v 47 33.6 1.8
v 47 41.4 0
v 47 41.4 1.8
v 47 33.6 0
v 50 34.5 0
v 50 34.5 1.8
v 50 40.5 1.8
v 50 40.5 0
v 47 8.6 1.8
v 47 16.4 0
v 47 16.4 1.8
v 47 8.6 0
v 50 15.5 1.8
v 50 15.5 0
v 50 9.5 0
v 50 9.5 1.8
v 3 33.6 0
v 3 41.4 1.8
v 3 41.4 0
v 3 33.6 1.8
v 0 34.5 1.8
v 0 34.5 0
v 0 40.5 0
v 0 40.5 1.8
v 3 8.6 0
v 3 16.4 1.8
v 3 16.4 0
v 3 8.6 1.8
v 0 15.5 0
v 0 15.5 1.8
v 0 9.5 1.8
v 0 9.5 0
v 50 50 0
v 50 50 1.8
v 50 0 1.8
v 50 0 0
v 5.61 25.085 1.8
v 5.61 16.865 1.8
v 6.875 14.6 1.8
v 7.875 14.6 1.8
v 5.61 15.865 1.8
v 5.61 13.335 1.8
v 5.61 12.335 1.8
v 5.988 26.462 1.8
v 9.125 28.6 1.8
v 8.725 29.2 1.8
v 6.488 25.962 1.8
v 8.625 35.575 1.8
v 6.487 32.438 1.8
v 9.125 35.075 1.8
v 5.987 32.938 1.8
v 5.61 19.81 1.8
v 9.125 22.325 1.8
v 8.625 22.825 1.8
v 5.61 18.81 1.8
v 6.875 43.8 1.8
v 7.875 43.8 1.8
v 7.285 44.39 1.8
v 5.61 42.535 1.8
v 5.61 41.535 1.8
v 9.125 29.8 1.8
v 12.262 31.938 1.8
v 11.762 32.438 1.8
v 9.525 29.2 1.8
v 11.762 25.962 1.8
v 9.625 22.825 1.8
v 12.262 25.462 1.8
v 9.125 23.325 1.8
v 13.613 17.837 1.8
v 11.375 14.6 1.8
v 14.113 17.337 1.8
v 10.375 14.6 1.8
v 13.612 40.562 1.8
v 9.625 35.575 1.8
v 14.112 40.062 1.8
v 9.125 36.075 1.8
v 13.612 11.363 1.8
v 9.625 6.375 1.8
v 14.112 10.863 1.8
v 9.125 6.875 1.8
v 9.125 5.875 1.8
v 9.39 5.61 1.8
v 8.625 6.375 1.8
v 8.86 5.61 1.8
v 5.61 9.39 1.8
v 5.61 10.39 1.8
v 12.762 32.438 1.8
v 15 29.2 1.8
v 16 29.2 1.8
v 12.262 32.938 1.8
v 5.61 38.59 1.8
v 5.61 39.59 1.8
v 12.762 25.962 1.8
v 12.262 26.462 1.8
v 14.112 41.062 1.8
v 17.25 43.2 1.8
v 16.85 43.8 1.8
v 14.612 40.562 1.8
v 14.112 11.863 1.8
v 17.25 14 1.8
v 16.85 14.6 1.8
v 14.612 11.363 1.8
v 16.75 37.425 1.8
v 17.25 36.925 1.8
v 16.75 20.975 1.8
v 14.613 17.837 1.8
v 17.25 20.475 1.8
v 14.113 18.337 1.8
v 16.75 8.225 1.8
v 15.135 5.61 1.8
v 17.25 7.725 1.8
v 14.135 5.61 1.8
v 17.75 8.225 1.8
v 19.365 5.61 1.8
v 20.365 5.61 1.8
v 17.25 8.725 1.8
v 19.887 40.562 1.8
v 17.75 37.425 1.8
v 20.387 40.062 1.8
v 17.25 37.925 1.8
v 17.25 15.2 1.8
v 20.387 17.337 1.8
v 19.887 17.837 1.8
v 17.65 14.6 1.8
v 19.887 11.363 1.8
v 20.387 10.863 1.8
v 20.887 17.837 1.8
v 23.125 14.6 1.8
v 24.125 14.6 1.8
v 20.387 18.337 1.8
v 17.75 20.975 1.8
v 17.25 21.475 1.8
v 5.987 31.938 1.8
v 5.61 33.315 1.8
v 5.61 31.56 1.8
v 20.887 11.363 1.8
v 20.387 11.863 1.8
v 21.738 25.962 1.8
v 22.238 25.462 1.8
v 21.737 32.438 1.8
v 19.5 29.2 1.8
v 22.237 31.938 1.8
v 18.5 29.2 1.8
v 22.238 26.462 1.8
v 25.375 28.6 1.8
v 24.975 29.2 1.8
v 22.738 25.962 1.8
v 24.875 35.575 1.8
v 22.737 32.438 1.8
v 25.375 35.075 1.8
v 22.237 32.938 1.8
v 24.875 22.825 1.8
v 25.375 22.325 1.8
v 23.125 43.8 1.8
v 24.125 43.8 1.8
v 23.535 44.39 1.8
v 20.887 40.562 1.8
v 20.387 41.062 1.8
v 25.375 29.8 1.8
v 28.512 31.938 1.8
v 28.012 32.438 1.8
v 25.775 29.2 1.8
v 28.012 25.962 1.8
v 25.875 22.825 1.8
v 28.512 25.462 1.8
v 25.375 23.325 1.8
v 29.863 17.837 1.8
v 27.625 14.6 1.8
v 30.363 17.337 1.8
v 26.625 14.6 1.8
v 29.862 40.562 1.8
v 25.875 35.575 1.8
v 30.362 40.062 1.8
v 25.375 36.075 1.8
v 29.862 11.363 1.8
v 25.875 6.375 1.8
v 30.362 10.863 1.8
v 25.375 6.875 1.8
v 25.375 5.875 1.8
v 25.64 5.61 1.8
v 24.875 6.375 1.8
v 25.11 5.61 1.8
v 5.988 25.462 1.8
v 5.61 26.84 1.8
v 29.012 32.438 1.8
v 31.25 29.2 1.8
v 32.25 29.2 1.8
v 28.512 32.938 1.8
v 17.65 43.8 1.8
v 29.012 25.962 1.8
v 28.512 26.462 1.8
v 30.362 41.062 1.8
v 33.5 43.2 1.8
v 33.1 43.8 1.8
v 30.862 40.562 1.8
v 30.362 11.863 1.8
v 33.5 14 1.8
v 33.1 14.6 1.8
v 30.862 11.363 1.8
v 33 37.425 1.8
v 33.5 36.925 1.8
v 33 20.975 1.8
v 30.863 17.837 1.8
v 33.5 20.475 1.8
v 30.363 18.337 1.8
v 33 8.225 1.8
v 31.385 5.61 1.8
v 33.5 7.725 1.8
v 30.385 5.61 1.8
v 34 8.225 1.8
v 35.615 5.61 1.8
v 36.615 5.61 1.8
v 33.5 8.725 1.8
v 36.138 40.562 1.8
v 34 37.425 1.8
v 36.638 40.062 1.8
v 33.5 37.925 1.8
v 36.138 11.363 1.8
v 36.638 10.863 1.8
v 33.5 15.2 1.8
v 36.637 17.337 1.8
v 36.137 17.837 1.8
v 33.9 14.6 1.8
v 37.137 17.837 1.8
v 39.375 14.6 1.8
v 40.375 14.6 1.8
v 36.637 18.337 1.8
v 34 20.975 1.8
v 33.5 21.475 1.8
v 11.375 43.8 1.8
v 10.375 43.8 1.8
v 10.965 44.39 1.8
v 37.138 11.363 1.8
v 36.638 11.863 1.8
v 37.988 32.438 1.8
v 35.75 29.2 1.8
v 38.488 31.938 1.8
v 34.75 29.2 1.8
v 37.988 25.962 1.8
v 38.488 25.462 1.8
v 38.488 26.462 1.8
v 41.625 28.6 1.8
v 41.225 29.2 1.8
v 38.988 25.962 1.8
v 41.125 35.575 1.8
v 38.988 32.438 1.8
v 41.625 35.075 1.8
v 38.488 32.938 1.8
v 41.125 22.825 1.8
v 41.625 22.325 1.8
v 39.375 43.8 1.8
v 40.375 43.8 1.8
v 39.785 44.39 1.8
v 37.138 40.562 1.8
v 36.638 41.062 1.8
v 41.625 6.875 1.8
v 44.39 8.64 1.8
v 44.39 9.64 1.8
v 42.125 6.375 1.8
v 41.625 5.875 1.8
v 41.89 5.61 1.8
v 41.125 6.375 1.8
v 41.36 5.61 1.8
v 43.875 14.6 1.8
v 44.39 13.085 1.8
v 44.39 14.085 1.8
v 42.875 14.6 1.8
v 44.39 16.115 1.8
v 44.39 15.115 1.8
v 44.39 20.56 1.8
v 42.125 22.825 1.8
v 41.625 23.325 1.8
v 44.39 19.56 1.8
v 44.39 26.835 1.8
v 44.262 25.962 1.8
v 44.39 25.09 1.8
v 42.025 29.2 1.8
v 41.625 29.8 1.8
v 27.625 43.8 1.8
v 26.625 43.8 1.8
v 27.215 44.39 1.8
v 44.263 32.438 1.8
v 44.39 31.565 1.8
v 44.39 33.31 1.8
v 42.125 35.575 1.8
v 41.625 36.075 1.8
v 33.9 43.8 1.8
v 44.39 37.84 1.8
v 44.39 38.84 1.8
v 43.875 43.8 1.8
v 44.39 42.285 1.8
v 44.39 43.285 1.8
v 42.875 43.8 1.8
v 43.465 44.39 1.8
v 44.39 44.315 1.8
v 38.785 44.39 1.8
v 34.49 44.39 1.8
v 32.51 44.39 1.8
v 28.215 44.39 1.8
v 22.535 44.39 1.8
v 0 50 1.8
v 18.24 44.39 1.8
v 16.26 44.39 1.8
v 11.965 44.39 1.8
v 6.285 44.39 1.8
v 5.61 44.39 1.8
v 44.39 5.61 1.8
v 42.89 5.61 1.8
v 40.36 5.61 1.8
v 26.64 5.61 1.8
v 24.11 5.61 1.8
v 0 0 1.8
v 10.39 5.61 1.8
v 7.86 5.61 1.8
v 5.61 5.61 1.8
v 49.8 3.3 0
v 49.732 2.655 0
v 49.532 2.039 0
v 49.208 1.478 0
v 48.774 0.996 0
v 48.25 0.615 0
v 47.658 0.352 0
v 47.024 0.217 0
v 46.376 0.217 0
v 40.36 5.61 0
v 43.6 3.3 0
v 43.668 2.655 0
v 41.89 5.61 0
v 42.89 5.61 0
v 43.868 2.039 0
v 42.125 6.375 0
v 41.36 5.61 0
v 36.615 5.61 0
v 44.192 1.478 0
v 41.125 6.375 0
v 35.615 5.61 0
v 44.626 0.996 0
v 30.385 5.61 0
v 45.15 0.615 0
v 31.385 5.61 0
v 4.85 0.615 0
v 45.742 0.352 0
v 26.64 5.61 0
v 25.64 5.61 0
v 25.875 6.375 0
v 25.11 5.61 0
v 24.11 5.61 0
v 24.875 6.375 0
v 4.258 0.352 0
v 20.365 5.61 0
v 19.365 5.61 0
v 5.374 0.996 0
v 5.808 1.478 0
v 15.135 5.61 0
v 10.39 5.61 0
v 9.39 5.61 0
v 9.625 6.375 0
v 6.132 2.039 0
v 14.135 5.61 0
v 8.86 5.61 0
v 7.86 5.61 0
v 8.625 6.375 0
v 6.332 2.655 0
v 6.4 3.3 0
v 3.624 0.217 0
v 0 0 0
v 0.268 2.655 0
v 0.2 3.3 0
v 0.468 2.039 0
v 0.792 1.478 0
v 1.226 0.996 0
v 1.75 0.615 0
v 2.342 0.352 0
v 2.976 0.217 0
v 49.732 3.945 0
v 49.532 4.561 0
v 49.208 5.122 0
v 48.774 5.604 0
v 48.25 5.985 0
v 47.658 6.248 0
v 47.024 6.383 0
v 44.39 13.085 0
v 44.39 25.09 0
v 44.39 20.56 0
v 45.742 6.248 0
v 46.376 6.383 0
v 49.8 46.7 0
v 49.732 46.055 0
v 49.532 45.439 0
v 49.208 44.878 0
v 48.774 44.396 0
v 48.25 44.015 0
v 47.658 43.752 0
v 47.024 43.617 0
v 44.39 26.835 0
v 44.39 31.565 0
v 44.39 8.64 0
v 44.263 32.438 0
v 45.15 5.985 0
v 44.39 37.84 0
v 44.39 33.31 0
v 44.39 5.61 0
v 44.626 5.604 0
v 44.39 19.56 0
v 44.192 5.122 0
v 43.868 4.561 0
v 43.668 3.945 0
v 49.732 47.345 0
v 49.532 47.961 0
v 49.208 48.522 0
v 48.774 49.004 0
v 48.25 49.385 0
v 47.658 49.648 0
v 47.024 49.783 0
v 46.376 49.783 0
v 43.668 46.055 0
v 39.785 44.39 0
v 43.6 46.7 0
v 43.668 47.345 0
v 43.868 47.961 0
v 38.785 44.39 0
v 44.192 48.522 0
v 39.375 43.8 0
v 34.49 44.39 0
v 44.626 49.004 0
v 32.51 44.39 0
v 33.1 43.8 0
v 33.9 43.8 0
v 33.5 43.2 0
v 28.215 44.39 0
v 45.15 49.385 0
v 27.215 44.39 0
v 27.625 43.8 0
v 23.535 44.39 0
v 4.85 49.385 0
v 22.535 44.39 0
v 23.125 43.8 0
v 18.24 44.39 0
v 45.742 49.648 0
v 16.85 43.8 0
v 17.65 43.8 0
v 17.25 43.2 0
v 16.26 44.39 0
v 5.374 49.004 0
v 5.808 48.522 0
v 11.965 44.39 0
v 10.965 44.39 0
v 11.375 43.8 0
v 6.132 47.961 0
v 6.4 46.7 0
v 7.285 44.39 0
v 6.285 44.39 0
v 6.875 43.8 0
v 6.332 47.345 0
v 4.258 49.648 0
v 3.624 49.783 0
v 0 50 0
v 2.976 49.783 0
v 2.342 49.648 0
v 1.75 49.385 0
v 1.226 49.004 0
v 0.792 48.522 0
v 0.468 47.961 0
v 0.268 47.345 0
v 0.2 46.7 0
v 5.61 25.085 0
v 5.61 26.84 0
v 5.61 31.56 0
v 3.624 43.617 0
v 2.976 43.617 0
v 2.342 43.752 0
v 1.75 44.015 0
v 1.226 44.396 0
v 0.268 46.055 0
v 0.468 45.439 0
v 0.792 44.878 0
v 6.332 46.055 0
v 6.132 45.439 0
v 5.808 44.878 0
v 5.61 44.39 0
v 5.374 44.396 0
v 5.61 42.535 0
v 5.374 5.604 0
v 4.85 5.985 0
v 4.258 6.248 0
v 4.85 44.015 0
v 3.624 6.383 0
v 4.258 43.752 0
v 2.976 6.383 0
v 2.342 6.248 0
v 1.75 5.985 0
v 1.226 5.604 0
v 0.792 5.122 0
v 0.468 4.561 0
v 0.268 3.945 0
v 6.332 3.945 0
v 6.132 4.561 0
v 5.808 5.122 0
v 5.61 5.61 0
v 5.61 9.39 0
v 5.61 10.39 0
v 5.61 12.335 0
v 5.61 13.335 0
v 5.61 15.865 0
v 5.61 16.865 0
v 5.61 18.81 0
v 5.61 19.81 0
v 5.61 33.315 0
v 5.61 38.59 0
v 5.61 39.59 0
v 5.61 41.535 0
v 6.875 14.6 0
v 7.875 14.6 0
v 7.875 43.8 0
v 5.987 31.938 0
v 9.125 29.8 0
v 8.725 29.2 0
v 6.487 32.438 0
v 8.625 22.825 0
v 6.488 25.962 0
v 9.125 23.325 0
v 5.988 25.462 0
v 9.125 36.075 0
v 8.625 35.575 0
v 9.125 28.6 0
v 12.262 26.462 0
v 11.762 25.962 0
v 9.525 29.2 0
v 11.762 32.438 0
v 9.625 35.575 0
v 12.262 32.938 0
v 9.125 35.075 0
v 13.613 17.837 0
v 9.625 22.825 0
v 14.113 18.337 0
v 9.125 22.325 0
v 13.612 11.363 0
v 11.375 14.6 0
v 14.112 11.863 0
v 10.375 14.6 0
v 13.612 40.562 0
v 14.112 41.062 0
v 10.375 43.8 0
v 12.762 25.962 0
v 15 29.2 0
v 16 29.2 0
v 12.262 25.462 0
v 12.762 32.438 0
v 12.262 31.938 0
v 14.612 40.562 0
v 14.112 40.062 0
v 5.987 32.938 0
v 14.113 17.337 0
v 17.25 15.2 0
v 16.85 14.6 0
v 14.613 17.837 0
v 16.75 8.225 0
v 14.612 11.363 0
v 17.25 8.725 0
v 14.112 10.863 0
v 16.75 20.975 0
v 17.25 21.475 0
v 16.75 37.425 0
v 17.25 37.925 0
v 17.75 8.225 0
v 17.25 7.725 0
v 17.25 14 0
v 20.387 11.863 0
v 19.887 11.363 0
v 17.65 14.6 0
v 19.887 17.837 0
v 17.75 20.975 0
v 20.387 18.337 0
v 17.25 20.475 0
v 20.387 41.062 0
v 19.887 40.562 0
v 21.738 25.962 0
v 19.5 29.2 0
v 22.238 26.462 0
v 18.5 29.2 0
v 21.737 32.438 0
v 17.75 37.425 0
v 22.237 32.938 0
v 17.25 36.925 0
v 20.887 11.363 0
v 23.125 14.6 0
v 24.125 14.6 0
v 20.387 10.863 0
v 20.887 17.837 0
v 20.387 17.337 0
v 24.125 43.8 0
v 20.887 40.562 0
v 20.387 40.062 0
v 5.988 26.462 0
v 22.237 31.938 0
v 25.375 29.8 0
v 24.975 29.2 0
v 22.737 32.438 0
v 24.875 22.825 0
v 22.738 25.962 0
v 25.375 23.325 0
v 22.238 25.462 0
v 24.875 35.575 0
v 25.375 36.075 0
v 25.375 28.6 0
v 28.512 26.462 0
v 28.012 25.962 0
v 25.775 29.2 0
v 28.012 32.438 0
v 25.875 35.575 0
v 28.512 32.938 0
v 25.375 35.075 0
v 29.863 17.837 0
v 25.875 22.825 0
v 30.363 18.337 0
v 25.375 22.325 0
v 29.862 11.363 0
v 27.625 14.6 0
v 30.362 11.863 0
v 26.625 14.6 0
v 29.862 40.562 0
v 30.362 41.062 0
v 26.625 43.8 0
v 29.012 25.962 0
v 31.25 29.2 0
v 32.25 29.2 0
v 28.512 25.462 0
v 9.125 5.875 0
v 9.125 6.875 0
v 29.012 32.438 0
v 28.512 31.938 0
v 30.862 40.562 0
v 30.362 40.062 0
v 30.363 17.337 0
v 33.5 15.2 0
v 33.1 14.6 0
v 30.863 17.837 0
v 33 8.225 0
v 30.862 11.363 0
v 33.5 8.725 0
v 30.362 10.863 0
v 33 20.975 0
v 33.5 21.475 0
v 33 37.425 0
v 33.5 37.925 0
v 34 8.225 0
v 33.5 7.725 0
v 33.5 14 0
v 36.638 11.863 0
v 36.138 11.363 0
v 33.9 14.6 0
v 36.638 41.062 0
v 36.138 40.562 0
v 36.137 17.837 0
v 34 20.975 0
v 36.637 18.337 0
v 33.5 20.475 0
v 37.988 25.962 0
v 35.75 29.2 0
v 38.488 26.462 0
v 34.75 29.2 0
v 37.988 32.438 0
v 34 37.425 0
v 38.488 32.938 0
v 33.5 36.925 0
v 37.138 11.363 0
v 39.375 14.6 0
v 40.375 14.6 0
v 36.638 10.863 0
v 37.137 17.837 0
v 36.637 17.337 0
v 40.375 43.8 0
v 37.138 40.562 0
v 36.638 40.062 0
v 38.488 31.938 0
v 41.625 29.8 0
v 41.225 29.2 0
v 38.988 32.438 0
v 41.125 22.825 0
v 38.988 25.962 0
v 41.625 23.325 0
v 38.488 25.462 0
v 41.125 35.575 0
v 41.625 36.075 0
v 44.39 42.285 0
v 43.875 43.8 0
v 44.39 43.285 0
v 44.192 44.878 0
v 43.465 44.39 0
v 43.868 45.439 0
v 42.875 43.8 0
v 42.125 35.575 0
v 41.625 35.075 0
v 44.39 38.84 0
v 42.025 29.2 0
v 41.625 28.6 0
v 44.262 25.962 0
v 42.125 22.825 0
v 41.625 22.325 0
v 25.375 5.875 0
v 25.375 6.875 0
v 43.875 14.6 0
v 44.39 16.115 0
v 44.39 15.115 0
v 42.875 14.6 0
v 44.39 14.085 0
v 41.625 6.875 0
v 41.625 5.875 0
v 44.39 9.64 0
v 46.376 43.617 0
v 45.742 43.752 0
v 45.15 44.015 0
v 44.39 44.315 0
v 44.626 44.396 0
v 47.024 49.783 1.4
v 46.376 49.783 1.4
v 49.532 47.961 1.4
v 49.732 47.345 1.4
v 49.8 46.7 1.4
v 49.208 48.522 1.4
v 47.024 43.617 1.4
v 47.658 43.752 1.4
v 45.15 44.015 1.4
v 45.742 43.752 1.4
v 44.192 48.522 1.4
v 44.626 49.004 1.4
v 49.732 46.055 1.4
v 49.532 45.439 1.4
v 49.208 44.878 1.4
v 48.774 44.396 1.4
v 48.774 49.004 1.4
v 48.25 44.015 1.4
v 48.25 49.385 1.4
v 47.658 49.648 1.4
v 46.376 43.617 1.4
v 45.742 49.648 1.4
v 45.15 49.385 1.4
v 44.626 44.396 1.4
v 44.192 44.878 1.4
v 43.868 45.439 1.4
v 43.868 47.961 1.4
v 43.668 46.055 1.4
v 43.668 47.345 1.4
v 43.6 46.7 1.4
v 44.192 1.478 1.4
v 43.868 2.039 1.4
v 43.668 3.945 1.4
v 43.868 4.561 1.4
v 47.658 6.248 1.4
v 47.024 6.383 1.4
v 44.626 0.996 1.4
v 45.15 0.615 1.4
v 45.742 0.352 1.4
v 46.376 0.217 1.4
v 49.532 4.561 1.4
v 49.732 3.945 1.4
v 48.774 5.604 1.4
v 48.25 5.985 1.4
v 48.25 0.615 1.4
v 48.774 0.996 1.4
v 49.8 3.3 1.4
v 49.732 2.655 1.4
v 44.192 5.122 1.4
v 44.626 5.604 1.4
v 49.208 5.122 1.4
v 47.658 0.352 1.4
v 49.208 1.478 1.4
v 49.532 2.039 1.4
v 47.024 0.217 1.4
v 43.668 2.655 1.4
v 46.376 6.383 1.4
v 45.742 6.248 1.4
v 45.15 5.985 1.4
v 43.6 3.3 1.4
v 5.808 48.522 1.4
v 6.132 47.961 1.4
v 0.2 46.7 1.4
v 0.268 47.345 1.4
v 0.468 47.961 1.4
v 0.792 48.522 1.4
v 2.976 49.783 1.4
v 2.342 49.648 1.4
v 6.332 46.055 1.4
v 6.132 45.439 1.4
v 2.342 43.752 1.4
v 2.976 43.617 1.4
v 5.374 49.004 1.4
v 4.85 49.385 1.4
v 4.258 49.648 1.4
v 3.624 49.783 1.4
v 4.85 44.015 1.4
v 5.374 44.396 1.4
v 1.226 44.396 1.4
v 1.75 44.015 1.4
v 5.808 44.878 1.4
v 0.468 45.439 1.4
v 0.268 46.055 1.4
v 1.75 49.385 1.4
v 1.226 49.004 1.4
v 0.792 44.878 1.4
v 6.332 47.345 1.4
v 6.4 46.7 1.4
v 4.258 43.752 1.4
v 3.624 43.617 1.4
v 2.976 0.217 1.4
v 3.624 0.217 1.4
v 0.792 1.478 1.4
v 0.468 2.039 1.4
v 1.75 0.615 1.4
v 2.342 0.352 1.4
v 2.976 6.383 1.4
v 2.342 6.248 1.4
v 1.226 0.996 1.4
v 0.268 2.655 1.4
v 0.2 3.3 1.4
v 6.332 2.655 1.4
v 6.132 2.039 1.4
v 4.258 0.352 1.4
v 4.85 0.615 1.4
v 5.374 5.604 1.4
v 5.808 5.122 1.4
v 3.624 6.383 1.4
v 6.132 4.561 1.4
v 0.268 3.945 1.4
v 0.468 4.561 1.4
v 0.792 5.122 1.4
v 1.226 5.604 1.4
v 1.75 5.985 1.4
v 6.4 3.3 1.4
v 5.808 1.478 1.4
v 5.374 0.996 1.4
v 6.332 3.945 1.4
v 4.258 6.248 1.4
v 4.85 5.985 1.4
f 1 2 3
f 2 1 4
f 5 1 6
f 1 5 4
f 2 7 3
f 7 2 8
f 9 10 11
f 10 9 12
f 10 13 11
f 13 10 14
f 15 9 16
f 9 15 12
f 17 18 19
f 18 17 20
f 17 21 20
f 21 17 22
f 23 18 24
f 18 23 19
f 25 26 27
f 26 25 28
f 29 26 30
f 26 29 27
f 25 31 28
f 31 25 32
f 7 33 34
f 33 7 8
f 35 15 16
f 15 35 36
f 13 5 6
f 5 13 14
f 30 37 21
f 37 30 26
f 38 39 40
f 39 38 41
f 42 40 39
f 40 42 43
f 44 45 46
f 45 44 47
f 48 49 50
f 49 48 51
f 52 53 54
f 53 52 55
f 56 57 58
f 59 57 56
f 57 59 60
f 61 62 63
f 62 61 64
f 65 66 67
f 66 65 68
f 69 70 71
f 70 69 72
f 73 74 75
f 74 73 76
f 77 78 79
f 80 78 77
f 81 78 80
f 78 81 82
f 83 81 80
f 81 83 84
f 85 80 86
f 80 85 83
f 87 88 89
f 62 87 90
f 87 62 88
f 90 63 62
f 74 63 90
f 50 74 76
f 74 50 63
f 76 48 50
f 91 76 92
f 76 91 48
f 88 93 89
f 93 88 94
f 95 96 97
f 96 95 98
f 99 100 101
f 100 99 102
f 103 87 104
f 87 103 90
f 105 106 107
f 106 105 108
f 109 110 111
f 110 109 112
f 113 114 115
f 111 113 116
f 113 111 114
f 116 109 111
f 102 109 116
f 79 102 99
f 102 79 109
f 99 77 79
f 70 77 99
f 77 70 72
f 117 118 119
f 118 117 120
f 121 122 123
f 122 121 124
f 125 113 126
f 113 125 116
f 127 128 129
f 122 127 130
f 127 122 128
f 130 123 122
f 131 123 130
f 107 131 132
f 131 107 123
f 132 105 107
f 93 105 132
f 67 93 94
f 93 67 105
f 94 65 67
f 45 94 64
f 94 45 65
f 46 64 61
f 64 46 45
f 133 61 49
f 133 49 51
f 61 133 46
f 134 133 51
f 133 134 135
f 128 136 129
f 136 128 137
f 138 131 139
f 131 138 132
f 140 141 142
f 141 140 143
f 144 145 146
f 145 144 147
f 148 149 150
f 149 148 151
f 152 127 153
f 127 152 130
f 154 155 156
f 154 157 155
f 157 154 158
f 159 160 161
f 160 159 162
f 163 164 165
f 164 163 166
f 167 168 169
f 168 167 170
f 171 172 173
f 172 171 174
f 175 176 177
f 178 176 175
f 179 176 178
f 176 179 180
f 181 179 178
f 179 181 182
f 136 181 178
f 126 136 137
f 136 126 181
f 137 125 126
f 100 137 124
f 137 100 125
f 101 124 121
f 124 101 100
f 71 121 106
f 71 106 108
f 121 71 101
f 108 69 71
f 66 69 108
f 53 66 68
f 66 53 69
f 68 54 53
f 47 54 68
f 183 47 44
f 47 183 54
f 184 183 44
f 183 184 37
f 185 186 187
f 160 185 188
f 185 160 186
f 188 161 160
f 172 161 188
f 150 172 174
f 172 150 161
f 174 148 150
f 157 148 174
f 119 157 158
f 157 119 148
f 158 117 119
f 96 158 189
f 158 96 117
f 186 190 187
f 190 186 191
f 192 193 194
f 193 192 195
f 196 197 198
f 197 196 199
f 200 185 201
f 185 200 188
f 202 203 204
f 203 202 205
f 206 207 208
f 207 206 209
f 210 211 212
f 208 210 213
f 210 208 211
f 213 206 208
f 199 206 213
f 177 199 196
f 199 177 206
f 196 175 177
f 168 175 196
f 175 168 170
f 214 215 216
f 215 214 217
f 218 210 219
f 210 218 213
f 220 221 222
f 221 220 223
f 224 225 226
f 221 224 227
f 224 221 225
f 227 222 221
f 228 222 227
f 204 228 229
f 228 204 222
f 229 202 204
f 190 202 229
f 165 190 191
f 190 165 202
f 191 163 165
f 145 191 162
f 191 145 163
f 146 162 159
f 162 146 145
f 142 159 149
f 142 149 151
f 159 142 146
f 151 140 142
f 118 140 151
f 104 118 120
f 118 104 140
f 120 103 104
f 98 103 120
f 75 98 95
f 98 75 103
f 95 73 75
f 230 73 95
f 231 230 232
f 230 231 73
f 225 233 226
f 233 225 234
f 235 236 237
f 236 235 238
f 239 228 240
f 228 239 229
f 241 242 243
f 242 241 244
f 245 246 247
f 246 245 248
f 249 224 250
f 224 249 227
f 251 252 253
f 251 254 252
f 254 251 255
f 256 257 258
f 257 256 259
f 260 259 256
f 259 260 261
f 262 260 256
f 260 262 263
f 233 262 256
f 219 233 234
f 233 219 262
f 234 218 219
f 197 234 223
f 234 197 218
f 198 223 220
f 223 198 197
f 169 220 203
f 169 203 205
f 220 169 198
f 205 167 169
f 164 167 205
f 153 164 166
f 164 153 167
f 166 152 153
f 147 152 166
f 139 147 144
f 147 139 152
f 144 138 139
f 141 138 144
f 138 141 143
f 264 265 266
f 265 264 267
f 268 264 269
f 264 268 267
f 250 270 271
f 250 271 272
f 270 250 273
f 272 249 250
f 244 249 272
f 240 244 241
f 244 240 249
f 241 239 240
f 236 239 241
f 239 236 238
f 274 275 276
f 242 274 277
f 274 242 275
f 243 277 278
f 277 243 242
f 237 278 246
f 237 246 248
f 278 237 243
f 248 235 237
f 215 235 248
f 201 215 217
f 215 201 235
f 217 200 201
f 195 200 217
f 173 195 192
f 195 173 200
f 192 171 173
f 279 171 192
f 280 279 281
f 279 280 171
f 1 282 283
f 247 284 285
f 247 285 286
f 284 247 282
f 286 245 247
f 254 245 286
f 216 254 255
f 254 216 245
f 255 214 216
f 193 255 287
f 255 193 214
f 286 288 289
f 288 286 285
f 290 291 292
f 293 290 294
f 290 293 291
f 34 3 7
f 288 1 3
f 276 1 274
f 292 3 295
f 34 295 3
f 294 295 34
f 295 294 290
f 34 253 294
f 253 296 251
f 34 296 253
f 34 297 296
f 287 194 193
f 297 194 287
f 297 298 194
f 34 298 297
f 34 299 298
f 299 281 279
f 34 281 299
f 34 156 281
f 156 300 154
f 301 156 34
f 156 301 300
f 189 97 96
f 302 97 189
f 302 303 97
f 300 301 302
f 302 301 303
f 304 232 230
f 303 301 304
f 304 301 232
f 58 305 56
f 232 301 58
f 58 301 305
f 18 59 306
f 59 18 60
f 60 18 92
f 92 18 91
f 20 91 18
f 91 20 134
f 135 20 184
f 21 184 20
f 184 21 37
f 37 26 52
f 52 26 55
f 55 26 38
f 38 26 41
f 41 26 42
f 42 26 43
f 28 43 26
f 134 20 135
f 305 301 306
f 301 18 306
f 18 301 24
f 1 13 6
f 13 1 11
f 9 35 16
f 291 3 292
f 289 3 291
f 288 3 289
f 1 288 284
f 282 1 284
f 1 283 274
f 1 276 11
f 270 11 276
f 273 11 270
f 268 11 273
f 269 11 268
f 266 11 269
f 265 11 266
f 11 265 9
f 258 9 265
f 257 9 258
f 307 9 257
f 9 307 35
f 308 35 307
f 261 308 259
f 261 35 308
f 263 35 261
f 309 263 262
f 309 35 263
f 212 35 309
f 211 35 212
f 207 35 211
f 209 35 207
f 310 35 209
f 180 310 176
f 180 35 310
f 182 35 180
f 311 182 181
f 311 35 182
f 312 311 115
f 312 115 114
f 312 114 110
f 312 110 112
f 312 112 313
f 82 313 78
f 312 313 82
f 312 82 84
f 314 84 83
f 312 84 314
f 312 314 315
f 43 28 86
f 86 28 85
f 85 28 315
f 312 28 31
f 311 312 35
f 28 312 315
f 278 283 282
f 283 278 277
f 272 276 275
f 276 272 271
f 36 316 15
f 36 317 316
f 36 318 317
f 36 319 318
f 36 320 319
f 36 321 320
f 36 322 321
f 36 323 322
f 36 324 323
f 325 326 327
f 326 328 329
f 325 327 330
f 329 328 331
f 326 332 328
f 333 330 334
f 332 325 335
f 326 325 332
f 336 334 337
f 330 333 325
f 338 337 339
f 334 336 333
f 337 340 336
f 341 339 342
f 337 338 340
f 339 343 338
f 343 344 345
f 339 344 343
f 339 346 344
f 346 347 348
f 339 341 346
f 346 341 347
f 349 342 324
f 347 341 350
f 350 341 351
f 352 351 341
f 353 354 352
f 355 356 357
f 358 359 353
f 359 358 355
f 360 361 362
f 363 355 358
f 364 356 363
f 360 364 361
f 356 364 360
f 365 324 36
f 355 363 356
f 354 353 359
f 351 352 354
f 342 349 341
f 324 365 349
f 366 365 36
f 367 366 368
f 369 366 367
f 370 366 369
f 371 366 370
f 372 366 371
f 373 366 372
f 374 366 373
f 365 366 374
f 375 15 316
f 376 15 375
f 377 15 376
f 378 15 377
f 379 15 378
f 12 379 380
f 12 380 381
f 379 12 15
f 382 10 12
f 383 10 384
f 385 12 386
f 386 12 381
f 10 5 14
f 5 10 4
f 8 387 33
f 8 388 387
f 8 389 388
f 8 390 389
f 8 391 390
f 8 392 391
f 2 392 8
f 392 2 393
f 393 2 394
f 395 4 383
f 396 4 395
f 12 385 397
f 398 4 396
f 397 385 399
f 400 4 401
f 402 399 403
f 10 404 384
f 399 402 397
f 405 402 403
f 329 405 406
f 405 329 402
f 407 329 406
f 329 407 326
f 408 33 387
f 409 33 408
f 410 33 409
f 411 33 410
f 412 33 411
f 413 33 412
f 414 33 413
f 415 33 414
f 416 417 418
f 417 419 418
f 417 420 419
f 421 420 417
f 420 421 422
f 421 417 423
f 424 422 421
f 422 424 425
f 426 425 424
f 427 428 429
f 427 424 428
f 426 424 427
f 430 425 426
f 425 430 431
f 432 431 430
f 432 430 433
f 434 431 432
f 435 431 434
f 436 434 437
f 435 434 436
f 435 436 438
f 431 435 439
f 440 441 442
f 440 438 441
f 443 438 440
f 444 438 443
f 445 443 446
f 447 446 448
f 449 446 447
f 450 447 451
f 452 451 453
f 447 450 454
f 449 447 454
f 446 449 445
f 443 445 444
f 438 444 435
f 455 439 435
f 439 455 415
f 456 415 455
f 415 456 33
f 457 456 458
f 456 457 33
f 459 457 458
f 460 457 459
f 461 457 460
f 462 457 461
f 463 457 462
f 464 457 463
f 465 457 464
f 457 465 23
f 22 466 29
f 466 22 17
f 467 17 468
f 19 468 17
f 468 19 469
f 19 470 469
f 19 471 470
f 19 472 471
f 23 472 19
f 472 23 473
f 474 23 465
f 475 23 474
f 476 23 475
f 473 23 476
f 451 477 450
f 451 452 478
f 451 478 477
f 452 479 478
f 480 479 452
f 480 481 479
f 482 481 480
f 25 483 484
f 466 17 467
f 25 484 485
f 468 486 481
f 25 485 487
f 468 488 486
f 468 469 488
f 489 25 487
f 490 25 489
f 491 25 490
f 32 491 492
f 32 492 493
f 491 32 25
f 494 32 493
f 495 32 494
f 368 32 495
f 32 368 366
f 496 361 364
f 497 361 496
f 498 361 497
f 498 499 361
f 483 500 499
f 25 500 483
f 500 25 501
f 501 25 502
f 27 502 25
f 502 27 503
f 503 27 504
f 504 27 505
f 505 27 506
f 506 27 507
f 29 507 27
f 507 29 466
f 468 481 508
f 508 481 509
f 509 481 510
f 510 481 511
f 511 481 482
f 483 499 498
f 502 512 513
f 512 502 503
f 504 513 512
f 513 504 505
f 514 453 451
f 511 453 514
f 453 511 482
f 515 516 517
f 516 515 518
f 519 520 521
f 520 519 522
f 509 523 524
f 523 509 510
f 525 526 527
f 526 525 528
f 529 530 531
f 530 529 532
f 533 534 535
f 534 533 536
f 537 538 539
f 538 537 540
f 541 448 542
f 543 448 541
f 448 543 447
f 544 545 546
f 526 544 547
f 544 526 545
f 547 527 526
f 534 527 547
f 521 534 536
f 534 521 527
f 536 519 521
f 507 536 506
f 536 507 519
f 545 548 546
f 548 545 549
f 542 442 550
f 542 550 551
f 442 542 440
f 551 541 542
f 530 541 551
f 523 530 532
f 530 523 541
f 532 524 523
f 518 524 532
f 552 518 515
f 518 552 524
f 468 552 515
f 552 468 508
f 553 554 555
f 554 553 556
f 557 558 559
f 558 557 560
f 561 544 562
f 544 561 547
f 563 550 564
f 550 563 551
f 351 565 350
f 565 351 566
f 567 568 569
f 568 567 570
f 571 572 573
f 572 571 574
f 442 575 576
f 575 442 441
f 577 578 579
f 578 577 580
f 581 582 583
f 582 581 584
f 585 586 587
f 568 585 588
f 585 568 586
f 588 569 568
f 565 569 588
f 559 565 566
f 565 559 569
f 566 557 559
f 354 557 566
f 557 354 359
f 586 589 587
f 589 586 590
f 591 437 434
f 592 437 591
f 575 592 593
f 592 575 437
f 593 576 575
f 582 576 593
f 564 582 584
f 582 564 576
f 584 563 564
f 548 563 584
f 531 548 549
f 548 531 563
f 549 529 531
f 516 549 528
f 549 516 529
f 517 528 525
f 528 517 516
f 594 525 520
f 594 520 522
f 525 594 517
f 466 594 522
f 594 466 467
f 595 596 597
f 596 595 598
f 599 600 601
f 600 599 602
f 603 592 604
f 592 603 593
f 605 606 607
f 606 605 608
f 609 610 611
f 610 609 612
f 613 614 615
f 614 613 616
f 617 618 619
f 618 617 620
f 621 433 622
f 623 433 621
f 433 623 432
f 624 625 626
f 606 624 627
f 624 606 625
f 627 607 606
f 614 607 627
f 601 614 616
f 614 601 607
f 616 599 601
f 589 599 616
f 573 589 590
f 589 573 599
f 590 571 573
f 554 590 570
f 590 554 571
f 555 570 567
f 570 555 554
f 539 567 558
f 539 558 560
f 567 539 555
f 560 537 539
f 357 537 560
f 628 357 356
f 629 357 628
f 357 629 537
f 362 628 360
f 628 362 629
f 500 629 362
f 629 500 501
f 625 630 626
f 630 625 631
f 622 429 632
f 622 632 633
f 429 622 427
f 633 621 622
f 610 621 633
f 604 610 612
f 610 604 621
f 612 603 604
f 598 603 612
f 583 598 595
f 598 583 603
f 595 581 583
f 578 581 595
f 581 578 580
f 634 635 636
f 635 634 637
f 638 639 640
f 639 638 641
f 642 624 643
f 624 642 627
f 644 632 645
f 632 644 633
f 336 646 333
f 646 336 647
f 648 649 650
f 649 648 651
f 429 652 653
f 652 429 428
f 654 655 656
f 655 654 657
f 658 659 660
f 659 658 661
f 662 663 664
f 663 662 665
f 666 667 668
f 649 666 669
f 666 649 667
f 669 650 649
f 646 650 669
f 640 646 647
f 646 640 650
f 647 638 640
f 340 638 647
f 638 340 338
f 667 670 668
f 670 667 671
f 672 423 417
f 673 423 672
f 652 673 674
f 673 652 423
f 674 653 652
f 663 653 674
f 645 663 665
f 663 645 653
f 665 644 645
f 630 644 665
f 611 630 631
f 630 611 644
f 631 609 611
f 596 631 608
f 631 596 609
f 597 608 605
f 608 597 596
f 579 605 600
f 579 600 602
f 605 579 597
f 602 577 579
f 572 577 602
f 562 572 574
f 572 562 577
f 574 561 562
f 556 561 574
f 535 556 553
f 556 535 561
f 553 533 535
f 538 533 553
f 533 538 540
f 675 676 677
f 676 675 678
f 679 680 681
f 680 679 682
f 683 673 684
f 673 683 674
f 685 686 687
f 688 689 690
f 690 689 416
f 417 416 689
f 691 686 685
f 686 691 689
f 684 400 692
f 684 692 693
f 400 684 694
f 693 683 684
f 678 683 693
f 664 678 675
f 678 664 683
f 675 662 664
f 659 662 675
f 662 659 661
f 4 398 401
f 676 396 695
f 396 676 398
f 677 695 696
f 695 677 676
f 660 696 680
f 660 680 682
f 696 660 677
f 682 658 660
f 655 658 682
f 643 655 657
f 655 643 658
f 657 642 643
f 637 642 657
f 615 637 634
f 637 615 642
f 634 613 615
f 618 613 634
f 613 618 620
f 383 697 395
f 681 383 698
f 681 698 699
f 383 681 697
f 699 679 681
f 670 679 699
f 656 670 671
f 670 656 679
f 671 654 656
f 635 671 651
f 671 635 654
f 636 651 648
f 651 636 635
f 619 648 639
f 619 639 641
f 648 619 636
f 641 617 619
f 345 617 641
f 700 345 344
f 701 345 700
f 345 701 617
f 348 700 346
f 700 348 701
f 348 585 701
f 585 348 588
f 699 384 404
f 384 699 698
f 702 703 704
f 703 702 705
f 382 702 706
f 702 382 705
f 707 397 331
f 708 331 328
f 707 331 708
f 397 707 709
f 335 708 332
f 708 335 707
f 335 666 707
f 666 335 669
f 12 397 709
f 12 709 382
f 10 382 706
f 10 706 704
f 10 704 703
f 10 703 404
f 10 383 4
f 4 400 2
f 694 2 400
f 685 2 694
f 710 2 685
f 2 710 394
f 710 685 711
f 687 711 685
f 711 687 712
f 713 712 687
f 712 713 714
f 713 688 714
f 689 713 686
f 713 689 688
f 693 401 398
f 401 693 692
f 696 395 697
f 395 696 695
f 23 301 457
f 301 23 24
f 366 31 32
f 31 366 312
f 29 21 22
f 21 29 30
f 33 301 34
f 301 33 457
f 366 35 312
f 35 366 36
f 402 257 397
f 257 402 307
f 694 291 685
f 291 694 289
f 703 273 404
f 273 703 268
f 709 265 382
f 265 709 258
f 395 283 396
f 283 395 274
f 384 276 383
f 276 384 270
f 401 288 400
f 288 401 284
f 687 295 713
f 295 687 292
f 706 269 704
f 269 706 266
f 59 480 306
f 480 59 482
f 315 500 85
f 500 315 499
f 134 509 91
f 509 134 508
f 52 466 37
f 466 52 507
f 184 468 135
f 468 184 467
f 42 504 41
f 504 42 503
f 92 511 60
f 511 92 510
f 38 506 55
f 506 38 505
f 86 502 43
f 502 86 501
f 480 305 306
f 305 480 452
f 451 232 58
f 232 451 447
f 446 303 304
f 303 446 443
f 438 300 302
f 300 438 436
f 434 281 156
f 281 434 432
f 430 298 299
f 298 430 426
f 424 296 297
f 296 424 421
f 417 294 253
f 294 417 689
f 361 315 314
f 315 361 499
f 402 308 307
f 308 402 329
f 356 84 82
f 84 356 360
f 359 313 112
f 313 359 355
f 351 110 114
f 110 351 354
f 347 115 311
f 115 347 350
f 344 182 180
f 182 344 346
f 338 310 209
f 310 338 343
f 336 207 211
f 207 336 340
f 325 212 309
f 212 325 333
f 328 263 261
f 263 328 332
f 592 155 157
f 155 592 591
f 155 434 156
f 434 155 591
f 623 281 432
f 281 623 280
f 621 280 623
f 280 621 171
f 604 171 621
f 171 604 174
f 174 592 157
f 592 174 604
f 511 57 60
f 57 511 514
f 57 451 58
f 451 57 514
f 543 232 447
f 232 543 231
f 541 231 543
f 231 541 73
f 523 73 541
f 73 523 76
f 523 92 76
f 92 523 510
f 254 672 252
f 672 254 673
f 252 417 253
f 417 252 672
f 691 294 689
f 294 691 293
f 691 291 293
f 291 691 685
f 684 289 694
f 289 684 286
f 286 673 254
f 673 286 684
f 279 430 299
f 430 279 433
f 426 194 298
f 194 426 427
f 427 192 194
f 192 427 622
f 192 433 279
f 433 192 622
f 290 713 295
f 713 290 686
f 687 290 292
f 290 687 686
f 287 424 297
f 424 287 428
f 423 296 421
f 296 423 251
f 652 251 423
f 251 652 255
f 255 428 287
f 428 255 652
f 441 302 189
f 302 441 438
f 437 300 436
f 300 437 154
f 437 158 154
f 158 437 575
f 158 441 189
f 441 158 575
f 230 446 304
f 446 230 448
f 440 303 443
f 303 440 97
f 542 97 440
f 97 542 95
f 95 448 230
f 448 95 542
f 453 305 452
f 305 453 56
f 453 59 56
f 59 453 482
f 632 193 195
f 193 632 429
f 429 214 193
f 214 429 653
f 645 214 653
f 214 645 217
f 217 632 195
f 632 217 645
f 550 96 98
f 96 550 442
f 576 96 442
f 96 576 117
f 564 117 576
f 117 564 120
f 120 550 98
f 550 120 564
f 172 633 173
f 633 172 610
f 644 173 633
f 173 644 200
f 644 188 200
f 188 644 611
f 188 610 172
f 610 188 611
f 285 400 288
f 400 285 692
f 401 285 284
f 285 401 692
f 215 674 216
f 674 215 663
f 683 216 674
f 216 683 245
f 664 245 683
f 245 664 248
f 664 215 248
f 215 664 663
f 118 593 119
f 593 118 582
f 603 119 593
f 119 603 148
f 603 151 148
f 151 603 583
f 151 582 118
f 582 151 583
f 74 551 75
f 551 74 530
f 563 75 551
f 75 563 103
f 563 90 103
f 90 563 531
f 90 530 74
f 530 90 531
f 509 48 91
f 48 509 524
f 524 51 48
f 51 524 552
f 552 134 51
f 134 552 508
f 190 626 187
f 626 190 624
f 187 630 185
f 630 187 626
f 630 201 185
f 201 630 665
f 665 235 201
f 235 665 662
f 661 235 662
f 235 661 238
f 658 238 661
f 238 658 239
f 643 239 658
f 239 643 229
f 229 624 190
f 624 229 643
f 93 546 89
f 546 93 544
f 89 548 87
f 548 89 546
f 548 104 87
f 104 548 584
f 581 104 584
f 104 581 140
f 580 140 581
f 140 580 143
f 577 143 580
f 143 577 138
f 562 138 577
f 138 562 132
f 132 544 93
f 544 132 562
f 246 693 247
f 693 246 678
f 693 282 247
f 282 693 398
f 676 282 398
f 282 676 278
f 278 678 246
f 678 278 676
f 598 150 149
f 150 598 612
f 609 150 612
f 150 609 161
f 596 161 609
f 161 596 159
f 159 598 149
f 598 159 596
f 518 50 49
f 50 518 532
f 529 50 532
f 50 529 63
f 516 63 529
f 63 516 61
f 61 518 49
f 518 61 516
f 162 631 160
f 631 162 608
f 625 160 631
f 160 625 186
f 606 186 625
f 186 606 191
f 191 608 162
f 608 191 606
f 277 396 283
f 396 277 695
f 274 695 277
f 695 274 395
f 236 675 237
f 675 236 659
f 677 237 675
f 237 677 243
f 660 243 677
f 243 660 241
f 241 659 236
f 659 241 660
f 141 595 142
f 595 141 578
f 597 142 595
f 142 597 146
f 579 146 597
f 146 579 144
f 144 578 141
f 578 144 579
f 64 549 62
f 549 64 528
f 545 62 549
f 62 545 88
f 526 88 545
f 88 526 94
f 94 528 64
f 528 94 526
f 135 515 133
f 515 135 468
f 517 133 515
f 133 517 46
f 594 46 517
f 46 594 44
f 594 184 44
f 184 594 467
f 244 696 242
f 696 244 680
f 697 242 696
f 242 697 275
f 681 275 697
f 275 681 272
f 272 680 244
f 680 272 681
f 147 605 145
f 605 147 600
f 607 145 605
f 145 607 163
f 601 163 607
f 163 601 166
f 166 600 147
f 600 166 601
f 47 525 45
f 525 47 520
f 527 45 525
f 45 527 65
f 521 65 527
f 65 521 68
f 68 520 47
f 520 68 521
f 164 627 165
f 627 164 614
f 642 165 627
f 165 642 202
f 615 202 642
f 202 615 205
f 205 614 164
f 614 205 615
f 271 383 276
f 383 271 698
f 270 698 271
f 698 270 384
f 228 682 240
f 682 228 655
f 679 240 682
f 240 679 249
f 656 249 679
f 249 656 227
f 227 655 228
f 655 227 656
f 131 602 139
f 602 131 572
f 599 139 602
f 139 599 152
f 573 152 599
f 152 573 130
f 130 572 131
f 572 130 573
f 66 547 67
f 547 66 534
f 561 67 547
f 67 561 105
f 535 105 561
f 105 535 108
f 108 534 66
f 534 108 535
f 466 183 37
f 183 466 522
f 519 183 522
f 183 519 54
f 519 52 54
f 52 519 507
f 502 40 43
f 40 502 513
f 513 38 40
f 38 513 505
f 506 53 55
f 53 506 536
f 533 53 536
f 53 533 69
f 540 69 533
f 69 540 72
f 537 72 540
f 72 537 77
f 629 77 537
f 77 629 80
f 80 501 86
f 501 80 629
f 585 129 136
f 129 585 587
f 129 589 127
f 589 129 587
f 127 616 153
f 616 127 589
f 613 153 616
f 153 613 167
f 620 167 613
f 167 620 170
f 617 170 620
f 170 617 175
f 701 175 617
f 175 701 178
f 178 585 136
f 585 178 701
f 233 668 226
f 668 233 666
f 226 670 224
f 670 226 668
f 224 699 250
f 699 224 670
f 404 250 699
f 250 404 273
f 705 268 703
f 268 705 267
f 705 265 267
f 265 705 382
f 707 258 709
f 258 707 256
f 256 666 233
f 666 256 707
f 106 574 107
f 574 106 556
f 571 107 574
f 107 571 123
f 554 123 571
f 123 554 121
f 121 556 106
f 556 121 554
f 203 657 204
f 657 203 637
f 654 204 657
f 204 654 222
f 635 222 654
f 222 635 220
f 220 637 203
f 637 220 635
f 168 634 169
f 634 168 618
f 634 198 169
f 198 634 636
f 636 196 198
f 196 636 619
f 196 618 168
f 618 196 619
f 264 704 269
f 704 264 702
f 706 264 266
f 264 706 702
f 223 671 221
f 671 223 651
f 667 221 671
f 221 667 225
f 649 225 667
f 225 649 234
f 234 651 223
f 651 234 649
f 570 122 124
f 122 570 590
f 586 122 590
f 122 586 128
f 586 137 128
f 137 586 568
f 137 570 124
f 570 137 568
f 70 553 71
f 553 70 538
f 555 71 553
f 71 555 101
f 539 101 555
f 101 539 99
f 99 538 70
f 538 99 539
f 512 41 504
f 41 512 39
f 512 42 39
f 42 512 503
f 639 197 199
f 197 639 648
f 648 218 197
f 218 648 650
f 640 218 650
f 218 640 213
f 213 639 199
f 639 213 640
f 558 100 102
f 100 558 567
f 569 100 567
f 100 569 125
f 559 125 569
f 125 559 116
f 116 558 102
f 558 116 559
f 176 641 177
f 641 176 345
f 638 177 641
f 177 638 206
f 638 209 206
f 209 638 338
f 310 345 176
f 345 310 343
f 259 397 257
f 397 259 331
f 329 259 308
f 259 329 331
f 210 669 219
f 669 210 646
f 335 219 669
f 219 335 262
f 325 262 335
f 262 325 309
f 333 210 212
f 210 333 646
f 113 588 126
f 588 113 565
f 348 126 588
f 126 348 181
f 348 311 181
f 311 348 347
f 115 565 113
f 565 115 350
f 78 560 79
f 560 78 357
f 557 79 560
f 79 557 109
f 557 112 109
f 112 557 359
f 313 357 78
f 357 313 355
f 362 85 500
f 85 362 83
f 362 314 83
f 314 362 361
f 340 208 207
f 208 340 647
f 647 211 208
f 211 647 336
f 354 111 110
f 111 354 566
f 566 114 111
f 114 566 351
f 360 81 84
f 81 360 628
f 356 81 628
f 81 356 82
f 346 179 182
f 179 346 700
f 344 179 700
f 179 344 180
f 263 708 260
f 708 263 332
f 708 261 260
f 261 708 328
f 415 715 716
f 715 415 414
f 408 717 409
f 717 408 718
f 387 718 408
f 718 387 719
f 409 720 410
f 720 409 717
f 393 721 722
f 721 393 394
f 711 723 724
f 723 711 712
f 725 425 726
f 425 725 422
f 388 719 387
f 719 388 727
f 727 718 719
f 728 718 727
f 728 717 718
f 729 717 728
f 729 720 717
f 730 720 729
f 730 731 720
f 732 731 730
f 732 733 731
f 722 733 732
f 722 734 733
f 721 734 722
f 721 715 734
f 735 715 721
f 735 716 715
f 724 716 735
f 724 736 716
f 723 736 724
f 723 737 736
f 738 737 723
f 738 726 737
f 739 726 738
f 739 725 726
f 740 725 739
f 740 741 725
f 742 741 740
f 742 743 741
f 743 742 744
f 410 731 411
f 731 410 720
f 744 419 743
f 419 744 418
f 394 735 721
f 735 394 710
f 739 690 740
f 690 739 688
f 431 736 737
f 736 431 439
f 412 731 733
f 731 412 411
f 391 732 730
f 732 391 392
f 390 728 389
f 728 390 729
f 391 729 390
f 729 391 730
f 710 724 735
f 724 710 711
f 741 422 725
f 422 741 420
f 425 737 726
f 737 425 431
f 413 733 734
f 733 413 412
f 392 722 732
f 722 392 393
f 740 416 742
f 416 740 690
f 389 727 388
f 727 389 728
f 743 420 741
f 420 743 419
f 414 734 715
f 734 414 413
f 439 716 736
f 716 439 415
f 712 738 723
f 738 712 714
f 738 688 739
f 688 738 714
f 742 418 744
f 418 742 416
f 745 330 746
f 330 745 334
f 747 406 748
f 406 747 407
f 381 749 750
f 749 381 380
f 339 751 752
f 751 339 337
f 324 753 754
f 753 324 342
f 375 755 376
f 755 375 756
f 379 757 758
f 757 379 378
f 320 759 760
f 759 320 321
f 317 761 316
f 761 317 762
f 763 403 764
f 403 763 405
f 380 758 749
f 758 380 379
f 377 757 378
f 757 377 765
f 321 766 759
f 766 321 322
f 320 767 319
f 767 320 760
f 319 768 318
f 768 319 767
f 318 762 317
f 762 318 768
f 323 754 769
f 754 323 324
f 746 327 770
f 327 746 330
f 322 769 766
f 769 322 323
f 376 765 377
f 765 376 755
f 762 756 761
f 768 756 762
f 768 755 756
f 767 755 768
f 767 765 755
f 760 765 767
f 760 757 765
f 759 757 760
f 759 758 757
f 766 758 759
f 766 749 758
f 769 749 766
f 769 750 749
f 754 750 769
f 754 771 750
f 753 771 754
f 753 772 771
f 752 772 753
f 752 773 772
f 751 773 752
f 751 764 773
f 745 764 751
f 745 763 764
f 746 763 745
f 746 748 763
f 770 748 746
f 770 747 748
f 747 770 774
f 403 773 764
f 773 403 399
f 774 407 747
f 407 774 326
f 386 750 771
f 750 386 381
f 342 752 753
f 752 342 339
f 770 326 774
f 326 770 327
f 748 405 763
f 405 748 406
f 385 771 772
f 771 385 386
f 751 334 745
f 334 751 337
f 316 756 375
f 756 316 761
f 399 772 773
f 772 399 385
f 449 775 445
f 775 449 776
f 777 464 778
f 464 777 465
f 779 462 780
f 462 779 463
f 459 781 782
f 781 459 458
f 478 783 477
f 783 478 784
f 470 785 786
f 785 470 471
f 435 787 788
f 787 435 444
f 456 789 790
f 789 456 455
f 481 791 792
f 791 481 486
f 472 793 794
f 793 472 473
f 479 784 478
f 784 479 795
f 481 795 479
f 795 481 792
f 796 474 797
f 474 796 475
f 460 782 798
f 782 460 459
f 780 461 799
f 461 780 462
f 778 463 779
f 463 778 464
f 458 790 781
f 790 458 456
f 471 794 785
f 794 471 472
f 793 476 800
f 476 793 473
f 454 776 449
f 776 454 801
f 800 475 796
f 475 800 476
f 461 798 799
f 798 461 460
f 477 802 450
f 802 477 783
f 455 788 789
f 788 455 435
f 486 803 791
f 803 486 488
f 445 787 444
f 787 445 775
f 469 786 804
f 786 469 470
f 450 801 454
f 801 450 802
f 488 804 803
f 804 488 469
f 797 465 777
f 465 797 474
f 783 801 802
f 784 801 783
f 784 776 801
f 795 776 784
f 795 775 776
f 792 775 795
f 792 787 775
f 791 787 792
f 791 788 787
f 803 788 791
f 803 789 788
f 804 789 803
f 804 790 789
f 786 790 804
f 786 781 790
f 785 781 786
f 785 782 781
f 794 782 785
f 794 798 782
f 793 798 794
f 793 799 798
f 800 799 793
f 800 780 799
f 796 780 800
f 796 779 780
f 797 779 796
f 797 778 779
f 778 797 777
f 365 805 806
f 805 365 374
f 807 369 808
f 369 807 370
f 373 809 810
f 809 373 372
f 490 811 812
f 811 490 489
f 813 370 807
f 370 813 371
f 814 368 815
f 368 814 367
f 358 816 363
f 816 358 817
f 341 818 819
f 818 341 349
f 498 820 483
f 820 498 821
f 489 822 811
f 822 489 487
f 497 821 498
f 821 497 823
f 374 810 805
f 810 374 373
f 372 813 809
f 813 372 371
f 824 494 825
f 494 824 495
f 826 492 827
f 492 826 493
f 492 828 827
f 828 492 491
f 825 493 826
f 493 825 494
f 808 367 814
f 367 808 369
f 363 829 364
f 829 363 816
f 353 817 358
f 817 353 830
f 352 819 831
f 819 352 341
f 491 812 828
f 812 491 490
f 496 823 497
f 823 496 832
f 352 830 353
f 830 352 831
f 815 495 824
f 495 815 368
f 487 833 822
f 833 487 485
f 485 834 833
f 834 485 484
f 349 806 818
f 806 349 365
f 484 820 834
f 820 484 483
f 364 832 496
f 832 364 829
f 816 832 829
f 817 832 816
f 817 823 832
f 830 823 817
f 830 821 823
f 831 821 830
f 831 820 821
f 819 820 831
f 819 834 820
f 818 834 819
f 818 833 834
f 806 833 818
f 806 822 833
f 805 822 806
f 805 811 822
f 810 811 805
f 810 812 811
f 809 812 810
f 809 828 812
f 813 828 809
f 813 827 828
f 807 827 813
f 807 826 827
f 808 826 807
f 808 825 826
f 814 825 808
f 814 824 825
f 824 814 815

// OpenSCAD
// A default lid matches the entire tray, replacing the former floor-only rule.
// The deepest enabled counter set and its pedestal determine the tray height.
// Explicit lid depth overrides remain available at scene, tray, and lid levels.
include <../../release/lib/counter_tray_designer_lib.1.scad>

function near(a,b) = abs(a-b) < 0.000001;
base = [[G_FLOOR_THICKNESS_N, 0.6],
    [COUNTER_SET, [COUNTER_SIZE_XYZ, [13,13,1.2]]]];
assert(near(_get_effective_lid_depth(base), 1.8));
assert(_get_effective_lid_depth([]) == 1.5);
assert(_get_effective_lid_depth(concat([[G_LID_DEPTH_N,2]],base)) == 2);
globals = [[G_FLOOR_THICKNESS_N,0.4]];
tray = [TRAY,[G_FLOOR_THICKNESS_N,0.8],
    [COUNTER_SET,[COUNTER_SIZE_XYZ,[13,13,1.2]]]];
assert(_get_effective_lid_depth(build_effective_lid_data([LID],tray,globals)) == 2);
assert(_get_effective_lid_depth(build_effective_lid_data([LID,[G_LID_DEPTH_N,1.1]],tray,globals)) == 1.1);
assert(_get_effective_lid_depth(build_effective_lid_data([LID],tray,concat([[G_LID_DEPTH_N,1.3]],globals))) == 1.3);
assert(_get_effective_lid_depth(build_effective_lid_data([LID],[TRAY,[G_LID_DEPTH_N,1.7]],globals)) == 1.7);
// Two 2 mm trays plus their matching 2 mm lid make a 6 mm stack.
stack = concat(globals, [[TRAY,[G_FLOOR_THICKNESS_N,0.8],[PRINT_COUNT_N,2],
    [COUNTER_SET,[COUNTER_SIZE_XYZ,[13,13,1.2]]]],[LID]]);
assert(_get_total_stack_height(stack,get_top_level_globals(stack)) == 6);

// Select a case and panel for mesh checks. Each case supplies its expected
// height from these dimensions, including a disabled 80 mm counter set.
CASE = "snafu";
PART = "lid";
FRAME = 1;
sets = CASE == "mixed" ? [
    [COUNTER_SET,[COUNTER_SIZE_XYZ,[13,13,1.2]],[ROWS_N,1]],
    [COUNTER_SET,[COUNTER_SIZE_XYZ,[13,13,3]],[ROWS_N,1]],
    [COUNTER_SET,[COUNTER_SIZE_XYZ,[13,13,80]],[ENABLED_B,false]]
] : [[COUNTER_SET,[COUNTER_SIZE_XYZ,[13,13,1.2]]]];
settings = concat([[G_DIMENSIONS_XY,[50,50]],[G_FRAME_STYLE_N,FRAME],
    [G_FLOOR_THICKNESS_N,0.6]],
    CASE == "explicit" ? [[G_LID_DEPTH_N,2]] : [],
    CASE == "pedestal" || CASE == "no_pedestal" ? [[COUNTER_PEDESTAL_MIN,0.7]] : [],
    CASE == "no_pedestal" ? [[COUNTER_PEDESTAL_B,false]] : [], sets);
expected_tray = CASE == "mixed" ? 3.6 : CASE == "pedestal" ? 2.5 : 1.8;
assert(near(_get_effective_tray_height(settings),expected_tray));
assert(near(_get_effective_lid_depth(settings),CASE == "explicit" ? 2 : expected_tray));
Make(concat([[_TRAY_ENABLED_B,PART=="tray"],[_LID_ENABLED_B,PART=="lid"]],settings));
